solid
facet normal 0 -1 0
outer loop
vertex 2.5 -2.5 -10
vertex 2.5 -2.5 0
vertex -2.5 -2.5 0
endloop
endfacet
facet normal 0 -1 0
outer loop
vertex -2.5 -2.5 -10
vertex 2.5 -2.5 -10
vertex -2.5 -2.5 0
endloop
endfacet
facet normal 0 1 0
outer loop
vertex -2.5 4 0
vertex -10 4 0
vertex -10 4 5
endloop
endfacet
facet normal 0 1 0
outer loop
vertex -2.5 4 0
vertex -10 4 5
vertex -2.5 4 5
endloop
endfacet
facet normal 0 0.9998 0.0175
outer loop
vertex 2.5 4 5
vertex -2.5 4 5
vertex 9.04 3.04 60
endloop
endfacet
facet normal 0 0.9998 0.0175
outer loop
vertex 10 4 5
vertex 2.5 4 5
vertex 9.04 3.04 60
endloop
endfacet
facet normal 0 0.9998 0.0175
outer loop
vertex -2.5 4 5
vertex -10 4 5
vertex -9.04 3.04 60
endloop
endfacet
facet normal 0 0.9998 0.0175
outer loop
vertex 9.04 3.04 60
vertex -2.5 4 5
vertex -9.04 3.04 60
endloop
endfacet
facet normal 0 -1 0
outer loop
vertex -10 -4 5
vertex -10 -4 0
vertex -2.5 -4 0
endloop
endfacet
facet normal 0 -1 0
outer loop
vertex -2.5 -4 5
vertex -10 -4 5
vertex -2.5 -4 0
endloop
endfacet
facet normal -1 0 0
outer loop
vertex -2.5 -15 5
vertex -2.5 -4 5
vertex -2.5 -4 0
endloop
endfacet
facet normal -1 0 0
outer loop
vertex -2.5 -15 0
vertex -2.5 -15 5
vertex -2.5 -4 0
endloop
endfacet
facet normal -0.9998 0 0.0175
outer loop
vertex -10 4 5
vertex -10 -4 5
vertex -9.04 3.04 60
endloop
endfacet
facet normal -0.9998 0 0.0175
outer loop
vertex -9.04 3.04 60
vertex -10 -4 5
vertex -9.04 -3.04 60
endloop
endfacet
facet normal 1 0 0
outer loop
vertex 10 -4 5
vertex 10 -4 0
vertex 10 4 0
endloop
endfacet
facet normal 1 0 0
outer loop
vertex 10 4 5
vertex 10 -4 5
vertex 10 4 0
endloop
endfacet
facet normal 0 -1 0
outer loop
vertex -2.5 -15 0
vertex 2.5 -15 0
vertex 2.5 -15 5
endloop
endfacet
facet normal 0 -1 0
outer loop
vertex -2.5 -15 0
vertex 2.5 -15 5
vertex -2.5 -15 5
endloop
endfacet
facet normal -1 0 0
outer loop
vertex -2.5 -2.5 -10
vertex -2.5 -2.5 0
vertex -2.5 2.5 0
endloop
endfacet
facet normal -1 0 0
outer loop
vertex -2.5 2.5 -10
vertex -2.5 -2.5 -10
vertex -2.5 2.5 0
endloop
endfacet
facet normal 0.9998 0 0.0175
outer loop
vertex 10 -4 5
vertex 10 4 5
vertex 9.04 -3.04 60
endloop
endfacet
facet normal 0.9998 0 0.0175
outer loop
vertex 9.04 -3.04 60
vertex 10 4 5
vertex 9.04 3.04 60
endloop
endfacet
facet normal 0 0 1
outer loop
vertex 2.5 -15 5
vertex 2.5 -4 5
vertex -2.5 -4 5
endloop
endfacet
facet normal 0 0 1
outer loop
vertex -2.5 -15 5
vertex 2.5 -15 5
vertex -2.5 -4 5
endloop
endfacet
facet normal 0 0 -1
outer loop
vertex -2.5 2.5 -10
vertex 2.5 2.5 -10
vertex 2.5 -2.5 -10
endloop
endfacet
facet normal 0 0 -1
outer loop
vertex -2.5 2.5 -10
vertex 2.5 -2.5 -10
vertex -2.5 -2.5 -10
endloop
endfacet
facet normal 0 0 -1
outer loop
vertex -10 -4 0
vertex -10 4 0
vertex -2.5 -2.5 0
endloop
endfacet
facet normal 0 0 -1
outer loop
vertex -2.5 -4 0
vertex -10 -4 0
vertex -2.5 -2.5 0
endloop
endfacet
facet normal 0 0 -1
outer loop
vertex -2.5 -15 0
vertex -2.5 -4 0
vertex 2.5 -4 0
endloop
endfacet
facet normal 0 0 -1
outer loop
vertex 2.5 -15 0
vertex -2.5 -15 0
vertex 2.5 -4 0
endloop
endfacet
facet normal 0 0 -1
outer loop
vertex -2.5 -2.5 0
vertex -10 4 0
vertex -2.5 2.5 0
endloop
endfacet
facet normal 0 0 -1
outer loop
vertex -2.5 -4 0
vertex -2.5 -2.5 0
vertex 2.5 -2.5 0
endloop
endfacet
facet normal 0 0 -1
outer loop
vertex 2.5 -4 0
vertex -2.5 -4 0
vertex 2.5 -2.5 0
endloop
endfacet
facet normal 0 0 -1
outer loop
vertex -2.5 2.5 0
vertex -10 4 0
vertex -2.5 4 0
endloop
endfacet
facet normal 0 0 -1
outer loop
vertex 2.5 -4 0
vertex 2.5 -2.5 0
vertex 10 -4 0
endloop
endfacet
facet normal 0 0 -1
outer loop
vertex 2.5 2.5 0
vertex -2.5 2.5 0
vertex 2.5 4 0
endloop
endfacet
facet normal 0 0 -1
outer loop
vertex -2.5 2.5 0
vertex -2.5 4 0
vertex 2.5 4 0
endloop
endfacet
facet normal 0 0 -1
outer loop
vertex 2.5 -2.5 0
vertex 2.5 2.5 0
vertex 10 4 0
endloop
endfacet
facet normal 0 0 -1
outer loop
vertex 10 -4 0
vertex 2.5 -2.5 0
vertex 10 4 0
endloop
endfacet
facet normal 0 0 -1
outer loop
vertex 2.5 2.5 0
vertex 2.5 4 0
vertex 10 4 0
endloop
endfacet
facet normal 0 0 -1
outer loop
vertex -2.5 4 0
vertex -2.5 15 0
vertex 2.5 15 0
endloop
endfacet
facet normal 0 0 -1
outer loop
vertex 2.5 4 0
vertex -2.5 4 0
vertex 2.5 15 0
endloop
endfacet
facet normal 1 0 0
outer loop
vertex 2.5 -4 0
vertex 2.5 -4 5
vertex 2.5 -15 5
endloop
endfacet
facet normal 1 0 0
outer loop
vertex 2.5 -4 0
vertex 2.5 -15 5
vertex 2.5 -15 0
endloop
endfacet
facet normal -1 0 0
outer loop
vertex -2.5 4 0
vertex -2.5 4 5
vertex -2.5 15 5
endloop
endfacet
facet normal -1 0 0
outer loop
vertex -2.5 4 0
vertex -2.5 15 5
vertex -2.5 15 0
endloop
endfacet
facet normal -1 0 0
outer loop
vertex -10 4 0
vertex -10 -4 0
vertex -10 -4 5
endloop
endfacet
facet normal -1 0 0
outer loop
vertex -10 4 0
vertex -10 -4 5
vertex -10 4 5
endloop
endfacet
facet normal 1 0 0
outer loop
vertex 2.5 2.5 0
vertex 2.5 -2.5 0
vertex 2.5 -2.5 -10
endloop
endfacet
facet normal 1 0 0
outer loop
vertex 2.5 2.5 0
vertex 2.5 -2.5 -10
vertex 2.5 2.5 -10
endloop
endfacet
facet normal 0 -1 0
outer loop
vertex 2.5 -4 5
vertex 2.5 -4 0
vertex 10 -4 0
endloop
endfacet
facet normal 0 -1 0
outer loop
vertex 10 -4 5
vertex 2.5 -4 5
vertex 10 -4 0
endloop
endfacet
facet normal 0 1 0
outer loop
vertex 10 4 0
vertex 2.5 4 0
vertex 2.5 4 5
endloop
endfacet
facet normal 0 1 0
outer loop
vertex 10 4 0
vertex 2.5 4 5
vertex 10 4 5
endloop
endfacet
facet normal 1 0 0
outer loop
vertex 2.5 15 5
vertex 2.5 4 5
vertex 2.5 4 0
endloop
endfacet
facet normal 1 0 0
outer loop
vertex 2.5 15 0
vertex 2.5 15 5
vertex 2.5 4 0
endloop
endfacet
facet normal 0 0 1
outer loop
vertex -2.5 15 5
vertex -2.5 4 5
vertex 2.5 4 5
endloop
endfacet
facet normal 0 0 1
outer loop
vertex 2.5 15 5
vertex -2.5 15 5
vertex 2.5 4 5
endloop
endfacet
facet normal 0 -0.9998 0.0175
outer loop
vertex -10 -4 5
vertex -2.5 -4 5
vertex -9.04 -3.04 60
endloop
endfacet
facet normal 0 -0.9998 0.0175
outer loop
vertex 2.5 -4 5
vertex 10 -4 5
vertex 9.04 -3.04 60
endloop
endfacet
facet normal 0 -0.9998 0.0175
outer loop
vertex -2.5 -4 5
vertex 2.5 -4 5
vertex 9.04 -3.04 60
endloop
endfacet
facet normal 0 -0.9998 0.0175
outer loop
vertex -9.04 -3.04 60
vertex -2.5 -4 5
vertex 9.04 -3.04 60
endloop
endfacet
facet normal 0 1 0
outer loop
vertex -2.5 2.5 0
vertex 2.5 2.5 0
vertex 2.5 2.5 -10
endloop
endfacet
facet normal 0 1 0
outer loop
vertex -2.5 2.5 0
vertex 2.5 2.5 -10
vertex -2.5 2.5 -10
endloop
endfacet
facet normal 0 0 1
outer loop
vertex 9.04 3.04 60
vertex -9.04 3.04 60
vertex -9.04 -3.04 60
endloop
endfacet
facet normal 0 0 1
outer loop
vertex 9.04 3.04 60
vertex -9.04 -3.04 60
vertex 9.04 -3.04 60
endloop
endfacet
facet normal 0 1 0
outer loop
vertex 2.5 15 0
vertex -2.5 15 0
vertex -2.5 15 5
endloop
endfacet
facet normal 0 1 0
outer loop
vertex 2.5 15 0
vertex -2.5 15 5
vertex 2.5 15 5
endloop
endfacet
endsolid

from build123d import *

# Parameters (mm, degrees)
SKETCH_1_W      = 20
SKETCH_1_H      = 8
EXTRUDE_1_DEPTH = 5
SKETCH_5_W      = 5
SKETCH_5_H      = 5
EXTRUDE_5_DEPTH = 10
SKETCH_8_W      = 20
SKETCH_8_H      = 8
EXTRUDE_6_DEPTH = 55
EXTRUDE_6_TAPER = 1
SKETCH_9_W      = 5
SKETCH_9_H      = 5
EXTRUDE_7_DEPTH = 11
SKETCH_10_W     = 5
SKETCH_10_H     = 5
EXTRUDE_8_DEPTH = 11


with BuildPart() as part:
    # ｽｹｯﾁ1 → ﾎﾞｽ - 押し出し1 (new body)
    with BuildSketch(Plane.XY):
        Rectangle(SKETCH_1_W, SKETCH_1_H)
    extrude(amount=EXTRUDE_1_DEPTH)

    # ｽｹｯﾁ5 → ﾎﾞｽ - 押し出し5 (add)
    with BuildSketch(Plane(origin=(0, 0, 0), x_dir=(-1, 0, 0), z_dir=(0, 0, -1))):
        Rectangle(SKETCH_5_W, SKETCH_5_H)
    extrude(amount=EXTRUDE_5_DEPTH)

    # ｽｹｯﾁ8 → ﾎﾞｽ - 押し出し6 (add)
    with BuildSketch(Plane.XY.offset(5)):
        Rectangle(SKETCH_8_W, SKETCH_8_H)
    extrude(amount=EXTRUDE_6_DEPTH, taper=EXTRUDE_6_TAPER)

    # ｽｹｯﾁ9 → ﾎﾞｽ - 押し出し7 (add)
    with BuildSketch(Plane(origin=(0, 4, 0), x_dir=(1, 0, 0), z_dir=(0, 1, 0))):
        with Locations((0, -2.5)):
            Rectangle(SKETCH_9_W, SKETCH_9_H)
    extrude(amount=EXTRUDE_7_DEPTH)

    # ｽｹｯﾁ10 → ﾎﾞｽ - 押し出し8 (add)
    with BuildSketch(Plane(origin=(0, -4, 0), x_dir=(-1, 0, 0), z_dir=(0, -1, 0))):
        with Locations((0, -2.5)):
            Rectangle(SKETCH_10_W, SKETCH_10_H)
    extrude(amount=EXTRUDE_8_DEPTH)


solid = part.part
